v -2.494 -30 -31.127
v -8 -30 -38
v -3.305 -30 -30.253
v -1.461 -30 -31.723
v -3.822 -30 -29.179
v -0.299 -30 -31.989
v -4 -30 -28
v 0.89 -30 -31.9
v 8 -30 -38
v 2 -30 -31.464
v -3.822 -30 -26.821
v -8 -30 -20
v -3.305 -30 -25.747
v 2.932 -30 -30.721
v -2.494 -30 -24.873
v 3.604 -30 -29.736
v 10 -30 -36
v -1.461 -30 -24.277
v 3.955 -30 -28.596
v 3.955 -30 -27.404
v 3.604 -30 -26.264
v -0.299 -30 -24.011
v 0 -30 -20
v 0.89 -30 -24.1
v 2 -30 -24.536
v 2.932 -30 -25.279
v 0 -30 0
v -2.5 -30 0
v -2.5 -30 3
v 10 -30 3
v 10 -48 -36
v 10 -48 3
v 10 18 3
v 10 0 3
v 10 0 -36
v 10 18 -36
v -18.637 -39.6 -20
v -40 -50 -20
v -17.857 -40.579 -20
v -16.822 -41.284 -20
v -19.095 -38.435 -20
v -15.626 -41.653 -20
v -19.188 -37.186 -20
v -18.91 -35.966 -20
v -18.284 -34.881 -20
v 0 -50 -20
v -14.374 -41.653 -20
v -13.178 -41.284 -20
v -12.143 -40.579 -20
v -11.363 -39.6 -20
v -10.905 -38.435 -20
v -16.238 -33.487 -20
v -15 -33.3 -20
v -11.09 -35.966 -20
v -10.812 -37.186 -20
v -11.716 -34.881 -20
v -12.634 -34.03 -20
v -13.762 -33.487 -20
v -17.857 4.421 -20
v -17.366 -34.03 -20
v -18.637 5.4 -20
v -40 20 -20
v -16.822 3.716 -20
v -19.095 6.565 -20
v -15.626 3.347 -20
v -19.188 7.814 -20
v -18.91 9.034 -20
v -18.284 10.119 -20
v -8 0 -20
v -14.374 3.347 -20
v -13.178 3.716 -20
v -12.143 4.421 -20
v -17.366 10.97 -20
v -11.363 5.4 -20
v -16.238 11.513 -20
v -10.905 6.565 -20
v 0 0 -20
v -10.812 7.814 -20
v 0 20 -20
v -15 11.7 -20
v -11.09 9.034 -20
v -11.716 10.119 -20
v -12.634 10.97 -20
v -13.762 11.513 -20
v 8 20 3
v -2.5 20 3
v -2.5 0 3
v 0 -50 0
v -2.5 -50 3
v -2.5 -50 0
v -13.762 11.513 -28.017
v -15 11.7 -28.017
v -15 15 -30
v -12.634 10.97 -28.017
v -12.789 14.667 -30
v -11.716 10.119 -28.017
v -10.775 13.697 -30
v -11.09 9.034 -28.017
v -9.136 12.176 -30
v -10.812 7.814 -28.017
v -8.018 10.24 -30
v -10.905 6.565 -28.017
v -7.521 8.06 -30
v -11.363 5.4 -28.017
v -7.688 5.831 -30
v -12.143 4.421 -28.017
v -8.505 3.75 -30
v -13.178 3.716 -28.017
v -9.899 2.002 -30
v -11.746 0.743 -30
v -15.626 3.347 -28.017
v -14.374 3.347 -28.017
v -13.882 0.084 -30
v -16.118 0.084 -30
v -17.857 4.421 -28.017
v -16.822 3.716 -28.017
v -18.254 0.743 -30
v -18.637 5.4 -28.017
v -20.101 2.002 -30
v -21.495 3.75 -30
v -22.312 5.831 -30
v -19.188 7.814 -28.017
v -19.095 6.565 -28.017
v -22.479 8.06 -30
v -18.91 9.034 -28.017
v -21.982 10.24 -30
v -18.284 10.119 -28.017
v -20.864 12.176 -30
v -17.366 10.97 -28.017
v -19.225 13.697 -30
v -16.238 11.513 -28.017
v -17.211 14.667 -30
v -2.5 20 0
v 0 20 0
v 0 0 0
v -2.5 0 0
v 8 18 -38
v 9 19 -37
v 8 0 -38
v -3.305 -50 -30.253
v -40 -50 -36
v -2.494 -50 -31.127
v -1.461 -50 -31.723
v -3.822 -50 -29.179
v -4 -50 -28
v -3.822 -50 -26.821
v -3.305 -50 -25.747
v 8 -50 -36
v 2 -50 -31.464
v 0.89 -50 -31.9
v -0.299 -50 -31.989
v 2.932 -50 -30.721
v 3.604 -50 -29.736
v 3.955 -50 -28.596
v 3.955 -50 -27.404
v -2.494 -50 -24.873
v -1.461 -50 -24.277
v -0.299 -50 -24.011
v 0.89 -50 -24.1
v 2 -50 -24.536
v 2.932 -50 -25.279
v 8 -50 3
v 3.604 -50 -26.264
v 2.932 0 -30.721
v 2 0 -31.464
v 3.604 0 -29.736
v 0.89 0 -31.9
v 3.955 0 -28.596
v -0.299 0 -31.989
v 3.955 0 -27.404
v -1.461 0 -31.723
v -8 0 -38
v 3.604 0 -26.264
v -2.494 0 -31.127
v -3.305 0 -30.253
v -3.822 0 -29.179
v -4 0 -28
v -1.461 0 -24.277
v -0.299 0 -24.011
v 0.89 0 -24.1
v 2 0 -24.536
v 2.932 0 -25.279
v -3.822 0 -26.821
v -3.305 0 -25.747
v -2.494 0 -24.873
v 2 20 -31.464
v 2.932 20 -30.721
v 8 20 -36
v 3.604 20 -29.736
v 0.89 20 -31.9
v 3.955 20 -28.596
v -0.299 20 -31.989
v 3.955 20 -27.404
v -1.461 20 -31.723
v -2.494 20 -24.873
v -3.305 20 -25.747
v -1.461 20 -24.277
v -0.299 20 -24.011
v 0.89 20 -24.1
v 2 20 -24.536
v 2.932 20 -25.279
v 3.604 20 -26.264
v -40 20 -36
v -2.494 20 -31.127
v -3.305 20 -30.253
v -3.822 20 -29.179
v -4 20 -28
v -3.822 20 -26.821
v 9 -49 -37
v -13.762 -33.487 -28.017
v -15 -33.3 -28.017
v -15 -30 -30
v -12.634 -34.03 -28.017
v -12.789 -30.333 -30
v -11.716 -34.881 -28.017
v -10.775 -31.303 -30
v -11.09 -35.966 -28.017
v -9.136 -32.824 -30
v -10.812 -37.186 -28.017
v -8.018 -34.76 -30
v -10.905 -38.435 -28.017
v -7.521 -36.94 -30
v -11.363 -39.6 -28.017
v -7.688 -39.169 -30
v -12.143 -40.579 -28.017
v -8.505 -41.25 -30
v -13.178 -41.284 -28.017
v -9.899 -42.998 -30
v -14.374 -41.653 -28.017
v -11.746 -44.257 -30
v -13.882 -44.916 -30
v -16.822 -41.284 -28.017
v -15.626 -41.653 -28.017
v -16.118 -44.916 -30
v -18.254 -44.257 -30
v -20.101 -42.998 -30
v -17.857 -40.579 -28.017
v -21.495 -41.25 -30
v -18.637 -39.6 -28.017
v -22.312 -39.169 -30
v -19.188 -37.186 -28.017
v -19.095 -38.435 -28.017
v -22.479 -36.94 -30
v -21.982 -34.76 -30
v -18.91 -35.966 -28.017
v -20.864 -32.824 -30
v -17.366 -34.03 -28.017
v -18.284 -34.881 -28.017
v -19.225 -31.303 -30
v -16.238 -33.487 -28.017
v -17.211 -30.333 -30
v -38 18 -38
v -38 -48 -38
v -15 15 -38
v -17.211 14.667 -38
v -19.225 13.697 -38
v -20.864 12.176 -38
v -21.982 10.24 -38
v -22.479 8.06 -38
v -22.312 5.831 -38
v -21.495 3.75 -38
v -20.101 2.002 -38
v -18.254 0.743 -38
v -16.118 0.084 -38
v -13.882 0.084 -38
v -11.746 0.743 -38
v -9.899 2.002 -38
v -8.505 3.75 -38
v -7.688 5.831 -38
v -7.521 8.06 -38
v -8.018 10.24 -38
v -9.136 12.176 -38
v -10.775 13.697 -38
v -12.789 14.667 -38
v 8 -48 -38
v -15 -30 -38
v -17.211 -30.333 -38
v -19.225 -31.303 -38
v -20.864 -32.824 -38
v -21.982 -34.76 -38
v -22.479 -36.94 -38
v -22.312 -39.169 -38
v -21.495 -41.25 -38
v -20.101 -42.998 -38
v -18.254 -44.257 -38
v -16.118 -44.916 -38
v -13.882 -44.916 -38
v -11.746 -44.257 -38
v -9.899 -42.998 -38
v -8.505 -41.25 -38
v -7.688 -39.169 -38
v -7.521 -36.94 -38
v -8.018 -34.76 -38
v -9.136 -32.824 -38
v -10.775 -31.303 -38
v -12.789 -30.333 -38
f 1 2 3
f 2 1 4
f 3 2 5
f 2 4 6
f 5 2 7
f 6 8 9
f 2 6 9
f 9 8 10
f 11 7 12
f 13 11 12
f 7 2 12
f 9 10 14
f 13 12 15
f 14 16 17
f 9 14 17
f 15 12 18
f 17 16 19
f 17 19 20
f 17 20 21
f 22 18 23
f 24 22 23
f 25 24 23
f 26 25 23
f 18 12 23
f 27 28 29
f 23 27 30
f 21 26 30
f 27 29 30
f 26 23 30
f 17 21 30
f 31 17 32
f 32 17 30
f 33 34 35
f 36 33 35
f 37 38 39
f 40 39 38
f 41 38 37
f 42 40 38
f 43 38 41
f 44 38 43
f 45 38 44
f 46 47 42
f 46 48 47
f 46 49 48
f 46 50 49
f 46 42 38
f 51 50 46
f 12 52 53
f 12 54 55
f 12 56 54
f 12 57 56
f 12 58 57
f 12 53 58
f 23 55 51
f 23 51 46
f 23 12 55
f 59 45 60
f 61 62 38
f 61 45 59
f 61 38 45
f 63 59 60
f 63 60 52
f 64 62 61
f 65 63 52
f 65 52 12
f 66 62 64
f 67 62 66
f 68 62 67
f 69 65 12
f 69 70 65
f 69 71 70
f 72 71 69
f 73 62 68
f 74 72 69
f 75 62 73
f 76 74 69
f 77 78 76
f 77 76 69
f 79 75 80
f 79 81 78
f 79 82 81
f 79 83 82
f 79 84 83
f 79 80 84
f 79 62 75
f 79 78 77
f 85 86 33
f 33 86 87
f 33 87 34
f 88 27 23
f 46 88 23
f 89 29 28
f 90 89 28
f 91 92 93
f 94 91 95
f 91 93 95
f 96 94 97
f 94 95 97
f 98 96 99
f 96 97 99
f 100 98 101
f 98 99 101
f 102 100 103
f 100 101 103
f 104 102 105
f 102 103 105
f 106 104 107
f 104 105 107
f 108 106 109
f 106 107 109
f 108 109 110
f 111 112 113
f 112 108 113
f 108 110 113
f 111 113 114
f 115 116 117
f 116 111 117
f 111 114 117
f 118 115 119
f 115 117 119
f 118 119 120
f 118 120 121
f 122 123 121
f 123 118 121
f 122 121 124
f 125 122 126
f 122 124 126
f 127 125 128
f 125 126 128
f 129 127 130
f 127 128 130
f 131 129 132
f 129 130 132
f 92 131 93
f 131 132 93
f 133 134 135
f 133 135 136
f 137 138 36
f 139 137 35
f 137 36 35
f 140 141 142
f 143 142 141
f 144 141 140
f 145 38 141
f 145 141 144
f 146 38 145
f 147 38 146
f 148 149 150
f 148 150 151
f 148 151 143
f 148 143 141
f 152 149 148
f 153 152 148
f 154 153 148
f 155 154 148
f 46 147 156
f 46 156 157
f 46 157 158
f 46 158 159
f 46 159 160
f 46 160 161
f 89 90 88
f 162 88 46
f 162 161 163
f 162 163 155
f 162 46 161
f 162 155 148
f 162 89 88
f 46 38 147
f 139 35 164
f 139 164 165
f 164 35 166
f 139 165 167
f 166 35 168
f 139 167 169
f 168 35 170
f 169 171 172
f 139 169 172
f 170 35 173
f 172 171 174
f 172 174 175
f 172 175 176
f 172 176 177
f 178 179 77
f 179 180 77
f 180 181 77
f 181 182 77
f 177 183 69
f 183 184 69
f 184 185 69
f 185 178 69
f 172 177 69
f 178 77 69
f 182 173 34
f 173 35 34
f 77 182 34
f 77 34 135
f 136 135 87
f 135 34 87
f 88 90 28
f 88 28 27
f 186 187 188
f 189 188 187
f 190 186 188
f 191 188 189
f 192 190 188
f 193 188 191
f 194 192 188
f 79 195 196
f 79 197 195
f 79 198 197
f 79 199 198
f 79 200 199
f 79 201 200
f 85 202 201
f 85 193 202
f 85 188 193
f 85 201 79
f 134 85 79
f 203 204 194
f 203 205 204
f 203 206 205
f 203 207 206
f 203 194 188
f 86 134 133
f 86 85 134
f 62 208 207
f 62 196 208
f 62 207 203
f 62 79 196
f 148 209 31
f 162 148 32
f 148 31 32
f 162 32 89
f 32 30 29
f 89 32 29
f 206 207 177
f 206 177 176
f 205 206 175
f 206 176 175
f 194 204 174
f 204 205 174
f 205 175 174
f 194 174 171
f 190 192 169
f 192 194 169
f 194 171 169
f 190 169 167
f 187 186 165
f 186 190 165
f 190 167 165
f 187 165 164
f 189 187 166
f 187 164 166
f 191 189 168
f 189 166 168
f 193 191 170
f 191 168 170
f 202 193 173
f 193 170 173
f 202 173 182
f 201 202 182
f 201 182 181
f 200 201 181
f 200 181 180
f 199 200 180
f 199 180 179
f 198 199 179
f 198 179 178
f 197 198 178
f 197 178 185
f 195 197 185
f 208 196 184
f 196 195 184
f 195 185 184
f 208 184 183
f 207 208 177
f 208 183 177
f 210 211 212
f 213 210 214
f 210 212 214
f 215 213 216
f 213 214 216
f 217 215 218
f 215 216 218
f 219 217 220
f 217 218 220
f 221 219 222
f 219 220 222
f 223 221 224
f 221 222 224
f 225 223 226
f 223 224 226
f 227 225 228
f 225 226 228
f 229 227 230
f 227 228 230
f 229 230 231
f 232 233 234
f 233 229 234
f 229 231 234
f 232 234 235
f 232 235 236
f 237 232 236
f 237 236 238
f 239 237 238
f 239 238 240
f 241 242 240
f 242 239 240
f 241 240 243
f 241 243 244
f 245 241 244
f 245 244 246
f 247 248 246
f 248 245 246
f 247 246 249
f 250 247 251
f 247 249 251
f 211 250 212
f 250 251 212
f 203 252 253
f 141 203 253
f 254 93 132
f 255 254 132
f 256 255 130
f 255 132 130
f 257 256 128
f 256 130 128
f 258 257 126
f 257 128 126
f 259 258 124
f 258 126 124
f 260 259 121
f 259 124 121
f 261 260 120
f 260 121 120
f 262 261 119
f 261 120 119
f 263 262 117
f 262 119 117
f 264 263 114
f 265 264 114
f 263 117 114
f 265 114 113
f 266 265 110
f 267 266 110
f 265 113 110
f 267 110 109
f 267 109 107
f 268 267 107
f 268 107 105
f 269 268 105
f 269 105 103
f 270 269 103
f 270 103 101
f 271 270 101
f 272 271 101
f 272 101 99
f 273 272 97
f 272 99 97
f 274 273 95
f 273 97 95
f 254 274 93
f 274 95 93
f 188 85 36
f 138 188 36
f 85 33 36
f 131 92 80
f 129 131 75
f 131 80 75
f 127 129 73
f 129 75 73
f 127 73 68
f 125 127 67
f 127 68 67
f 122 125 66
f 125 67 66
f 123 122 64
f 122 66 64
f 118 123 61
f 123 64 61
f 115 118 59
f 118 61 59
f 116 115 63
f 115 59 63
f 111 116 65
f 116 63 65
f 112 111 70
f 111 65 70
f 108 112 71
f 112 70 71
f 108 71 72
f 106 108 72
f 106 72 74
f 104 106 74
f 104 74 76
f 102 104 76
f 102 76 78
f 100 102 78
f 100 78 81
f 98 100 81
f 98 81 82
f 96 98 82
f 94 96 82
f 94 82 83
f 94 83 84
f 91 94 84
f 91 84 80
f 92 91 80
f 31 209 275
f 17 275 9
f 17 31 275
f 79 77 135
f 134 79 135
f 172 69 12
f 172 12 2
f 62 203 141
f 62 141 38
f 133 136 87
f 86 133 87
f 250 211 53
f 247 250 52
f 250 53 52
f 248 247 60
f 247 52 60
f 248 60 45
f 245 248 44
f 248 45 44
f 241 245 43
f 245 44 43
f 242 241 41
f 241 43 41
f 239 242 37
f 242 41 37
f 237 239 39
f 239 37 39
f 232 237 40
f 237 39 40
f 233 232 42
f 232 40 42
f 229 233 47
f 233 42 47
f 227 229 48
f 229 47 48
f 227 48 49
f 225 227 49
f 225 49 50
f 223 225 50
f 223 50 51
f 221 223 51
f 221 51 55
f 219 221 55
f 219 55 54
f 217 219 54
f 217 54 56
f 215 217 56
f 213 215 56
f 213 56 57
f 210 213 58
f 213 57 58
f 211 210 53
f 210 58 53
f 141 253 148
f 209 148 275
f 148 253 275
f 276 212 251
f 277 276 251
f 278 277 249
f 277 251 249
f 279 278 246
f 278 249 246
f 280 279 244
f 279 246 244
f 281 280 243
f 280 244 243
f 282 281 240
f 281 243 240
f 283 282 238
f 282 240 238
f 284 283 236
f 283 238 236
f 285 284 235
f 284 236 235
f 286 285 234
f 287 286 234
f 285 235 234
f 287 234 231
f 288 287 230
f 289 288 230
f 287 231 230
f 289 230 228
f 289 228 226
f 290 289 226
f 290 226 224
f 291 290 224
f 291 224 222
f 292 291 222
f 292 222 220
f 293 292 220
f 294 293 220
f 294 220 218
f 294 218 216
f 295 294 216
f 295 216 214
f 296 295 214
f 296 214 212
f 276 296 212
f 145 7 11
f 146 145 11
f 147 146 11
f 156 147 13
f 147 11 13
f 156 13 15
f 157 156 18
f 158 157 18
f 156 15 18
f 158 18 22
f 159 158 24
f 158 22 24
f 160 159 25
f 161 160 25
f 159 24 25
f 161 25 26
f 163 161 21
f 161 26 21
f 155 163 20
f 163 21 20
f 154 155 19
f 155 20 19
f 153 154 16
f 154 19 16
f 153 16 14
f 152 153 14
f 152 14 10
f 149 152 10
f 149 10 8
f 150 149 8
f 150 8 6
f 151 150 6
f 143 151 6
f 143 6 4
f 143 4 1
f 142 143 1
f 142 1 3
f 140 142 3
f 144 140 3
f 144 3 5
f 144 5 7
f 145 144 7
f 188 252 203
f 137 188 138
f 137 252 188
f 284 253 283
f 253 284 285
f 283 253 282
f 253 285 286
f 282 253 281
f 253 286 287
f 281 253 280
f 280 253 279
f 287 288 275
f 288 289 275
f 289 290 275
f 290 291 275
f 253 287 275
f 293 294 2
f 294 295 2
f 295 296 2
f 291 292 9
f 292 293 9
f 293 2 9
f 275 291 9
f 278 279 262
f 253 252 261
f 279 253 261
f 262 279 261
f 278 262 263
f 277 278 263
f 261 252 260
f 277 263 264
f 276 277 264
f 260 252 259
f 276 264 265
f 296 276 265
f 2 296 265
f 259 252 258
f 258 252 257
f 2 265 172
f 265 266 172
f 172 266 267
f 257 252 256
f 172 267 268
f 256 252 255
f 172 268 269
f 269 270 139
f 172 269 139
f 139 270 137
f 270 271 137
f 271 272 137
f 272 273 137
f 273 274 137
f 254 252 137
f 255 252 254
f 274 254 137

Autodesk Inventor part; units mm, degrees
ref_plane "YZ Plane" through (0, 0, 0) normal (1, 0, 0) x (0, 1, 0)
sketch "Sketch1" plane through (0, 0, 0) normal (0, 1, 0) x (-1, 0, 0)
  line L0 (0, -20) -> (40, -20)
  line L1 (40, -20) -> (40, -38)
  line L2 (0, -20) -> (0, 0)
  line L3 (0, 0) -> (2.5, 0)
  line L4 (2.5, 0) -> (2.5, 3)
  line L5 (2.5, 3) -> (-10, 3)
  line L6 (-10, 3) -> (-10, -38)
  line L7 (-10, -38) -> (40, -38)
  circle A0 centre (0, -28) radius 4
  point P0 (-3.75, 3)
  point P1 (1.25, 0)
  dimension "d1" = 40
  dimension "d2" = 18
  dimension "d4" = 12.5
  dimension "d5" = 10
  dimension "d6" = 3
  dimension "d7" = 20
  dimension "d8" = 8
  dimension "d9" = 10
  dimension "d10" = 10
extrude "Extrusion1" add sketch "Sketch1" along normal blind 20
sketch "Sketch2" plane through (0, 0, 0) normal (0, -1, 0) x (1, 0, 0)
  point P0 (0, 0)
sketch "Sketch3" plane through (0, 0, 0) normal (0, -1, 0) x (1, 0, 0)
  line L0 (10, -38) -> (-40, -38) projected
  line L1 (-8, -38) -> (-8, -20)
  line L2 (-40, -20) -> (0, -20) projected
  line L3 (10, 3) -> (10, -38) projected
  line L4 (-8, -38) -> (-40, -38)
  line L5 (-40, -38) -> (-40, -20) projected
  line L6 (-40, -20) -> (-8, -20)
  point P0 (0, 0)
  dimension "d13" = 18
extrude "Extrusion2" add sketch "Sketch3" along normal blind 15
ref_plane "Work Plane1" through (0, -15, 0) normal (0, -1, 0) x (1, 0, 0)
mirror "Mirror1" about plane through (0, -15, 0) normal (0, -1, 0) of "Extrusion1"
ref_plane "Work Plane2" through (0, -15, 0) normal (0, -1, 0) x (1, 0, 0)
mirror "Mirror2" about plane through (0, -15, 0) normal (0, -1, 0) of "Extrusion2"
sketch "Sketch4" plane through (10, 20, -38) normal (0, 0, -1) x (-1, 0, 0)
  circle A0 centre (25, -12.5) radius 7.5
  circle A1 centre (25, -57.5) radius 7.5
  line L0 (50, -70) -> (50, 0) projected
  line L1 (0, 0) -> (50, 0) projected
  line L2 (0, -70) -> (50, -70) projected
  point P0 (10, -20)
  dimension "d18" = 15
  dimension "d19" = 15
  dimension "d20" = 25
  dimension "d21" = 12.5
  dimension "d22" = 12.5
  dimension "d23" = 25
hole "Hole1" at (-15, 7.5, -38) at (-15, -37.5, -38) direction (0, 0, 1) diameter 15 depth 8 tip angle 118
sketch "Sketch5" plane through (10, 20, -38) normal (0, 0, -1) x (-1, 0, 0)
  circle A0 centre (25, -12.5) radius 4.2
  circle A1 centre (25, -57.5) radius 4.2
  line L0 (50, -70) -> (50, 0) projected
  line L1 (0, 0) -> (50, 0) projected
  line L2 (0, -70) -> (50, -70) projected
  point P0 (10, -20)
  dimension "d31" = 8.4
  dimension "d32" = 8.4
  dimension "d33" = 25
  dimension "d34" = 12.5
  dimension "d35" = 25
  dimension "d36" = 12.5
hole "Hole2" at (-15, 7.5, -38) at (-15, -37.5, -38) direction (0, 0, 1) diameter 8.4 end through all
chamfer "Chamfer1" distance 2 angle 45 1 edges at (-15, 20, -38) measured on face at (-33.7241, -8.9202, -38)
chamfer "Chamfer2" distance 2 angle 45 1 edges at (-40, -16, -38) measured on face at (-33.7241, -21.7465, -38)
chamfer "Chamfer3" distance 2 angle 45 1 edges at (-14, -50, -38) measured on face at (-32.3908, -21.7465, -38)
chamfer "Chamfer4" distance 2 angle 45 1 edges at (10, 9, -38) measured on face at (-32.3908, -21.0798, -38)
chamfer "Chamfer5" distance 2 angle 45 1 edges at (10, -39, -38) measured on face at (-32.3908, -21.0798, -38)
chamfer "Chamfer6" distance 2 angle 45 1 edges at (10, 20, -16.5) measured on face at (-28, 20, -28)
chamfer "Chamfer7" distance 2 angle 45 1 edges at (10, -50, -16.5) measured on face at (-28, -50, -28)
properties part number "Lager" material "Iron, Cast"
